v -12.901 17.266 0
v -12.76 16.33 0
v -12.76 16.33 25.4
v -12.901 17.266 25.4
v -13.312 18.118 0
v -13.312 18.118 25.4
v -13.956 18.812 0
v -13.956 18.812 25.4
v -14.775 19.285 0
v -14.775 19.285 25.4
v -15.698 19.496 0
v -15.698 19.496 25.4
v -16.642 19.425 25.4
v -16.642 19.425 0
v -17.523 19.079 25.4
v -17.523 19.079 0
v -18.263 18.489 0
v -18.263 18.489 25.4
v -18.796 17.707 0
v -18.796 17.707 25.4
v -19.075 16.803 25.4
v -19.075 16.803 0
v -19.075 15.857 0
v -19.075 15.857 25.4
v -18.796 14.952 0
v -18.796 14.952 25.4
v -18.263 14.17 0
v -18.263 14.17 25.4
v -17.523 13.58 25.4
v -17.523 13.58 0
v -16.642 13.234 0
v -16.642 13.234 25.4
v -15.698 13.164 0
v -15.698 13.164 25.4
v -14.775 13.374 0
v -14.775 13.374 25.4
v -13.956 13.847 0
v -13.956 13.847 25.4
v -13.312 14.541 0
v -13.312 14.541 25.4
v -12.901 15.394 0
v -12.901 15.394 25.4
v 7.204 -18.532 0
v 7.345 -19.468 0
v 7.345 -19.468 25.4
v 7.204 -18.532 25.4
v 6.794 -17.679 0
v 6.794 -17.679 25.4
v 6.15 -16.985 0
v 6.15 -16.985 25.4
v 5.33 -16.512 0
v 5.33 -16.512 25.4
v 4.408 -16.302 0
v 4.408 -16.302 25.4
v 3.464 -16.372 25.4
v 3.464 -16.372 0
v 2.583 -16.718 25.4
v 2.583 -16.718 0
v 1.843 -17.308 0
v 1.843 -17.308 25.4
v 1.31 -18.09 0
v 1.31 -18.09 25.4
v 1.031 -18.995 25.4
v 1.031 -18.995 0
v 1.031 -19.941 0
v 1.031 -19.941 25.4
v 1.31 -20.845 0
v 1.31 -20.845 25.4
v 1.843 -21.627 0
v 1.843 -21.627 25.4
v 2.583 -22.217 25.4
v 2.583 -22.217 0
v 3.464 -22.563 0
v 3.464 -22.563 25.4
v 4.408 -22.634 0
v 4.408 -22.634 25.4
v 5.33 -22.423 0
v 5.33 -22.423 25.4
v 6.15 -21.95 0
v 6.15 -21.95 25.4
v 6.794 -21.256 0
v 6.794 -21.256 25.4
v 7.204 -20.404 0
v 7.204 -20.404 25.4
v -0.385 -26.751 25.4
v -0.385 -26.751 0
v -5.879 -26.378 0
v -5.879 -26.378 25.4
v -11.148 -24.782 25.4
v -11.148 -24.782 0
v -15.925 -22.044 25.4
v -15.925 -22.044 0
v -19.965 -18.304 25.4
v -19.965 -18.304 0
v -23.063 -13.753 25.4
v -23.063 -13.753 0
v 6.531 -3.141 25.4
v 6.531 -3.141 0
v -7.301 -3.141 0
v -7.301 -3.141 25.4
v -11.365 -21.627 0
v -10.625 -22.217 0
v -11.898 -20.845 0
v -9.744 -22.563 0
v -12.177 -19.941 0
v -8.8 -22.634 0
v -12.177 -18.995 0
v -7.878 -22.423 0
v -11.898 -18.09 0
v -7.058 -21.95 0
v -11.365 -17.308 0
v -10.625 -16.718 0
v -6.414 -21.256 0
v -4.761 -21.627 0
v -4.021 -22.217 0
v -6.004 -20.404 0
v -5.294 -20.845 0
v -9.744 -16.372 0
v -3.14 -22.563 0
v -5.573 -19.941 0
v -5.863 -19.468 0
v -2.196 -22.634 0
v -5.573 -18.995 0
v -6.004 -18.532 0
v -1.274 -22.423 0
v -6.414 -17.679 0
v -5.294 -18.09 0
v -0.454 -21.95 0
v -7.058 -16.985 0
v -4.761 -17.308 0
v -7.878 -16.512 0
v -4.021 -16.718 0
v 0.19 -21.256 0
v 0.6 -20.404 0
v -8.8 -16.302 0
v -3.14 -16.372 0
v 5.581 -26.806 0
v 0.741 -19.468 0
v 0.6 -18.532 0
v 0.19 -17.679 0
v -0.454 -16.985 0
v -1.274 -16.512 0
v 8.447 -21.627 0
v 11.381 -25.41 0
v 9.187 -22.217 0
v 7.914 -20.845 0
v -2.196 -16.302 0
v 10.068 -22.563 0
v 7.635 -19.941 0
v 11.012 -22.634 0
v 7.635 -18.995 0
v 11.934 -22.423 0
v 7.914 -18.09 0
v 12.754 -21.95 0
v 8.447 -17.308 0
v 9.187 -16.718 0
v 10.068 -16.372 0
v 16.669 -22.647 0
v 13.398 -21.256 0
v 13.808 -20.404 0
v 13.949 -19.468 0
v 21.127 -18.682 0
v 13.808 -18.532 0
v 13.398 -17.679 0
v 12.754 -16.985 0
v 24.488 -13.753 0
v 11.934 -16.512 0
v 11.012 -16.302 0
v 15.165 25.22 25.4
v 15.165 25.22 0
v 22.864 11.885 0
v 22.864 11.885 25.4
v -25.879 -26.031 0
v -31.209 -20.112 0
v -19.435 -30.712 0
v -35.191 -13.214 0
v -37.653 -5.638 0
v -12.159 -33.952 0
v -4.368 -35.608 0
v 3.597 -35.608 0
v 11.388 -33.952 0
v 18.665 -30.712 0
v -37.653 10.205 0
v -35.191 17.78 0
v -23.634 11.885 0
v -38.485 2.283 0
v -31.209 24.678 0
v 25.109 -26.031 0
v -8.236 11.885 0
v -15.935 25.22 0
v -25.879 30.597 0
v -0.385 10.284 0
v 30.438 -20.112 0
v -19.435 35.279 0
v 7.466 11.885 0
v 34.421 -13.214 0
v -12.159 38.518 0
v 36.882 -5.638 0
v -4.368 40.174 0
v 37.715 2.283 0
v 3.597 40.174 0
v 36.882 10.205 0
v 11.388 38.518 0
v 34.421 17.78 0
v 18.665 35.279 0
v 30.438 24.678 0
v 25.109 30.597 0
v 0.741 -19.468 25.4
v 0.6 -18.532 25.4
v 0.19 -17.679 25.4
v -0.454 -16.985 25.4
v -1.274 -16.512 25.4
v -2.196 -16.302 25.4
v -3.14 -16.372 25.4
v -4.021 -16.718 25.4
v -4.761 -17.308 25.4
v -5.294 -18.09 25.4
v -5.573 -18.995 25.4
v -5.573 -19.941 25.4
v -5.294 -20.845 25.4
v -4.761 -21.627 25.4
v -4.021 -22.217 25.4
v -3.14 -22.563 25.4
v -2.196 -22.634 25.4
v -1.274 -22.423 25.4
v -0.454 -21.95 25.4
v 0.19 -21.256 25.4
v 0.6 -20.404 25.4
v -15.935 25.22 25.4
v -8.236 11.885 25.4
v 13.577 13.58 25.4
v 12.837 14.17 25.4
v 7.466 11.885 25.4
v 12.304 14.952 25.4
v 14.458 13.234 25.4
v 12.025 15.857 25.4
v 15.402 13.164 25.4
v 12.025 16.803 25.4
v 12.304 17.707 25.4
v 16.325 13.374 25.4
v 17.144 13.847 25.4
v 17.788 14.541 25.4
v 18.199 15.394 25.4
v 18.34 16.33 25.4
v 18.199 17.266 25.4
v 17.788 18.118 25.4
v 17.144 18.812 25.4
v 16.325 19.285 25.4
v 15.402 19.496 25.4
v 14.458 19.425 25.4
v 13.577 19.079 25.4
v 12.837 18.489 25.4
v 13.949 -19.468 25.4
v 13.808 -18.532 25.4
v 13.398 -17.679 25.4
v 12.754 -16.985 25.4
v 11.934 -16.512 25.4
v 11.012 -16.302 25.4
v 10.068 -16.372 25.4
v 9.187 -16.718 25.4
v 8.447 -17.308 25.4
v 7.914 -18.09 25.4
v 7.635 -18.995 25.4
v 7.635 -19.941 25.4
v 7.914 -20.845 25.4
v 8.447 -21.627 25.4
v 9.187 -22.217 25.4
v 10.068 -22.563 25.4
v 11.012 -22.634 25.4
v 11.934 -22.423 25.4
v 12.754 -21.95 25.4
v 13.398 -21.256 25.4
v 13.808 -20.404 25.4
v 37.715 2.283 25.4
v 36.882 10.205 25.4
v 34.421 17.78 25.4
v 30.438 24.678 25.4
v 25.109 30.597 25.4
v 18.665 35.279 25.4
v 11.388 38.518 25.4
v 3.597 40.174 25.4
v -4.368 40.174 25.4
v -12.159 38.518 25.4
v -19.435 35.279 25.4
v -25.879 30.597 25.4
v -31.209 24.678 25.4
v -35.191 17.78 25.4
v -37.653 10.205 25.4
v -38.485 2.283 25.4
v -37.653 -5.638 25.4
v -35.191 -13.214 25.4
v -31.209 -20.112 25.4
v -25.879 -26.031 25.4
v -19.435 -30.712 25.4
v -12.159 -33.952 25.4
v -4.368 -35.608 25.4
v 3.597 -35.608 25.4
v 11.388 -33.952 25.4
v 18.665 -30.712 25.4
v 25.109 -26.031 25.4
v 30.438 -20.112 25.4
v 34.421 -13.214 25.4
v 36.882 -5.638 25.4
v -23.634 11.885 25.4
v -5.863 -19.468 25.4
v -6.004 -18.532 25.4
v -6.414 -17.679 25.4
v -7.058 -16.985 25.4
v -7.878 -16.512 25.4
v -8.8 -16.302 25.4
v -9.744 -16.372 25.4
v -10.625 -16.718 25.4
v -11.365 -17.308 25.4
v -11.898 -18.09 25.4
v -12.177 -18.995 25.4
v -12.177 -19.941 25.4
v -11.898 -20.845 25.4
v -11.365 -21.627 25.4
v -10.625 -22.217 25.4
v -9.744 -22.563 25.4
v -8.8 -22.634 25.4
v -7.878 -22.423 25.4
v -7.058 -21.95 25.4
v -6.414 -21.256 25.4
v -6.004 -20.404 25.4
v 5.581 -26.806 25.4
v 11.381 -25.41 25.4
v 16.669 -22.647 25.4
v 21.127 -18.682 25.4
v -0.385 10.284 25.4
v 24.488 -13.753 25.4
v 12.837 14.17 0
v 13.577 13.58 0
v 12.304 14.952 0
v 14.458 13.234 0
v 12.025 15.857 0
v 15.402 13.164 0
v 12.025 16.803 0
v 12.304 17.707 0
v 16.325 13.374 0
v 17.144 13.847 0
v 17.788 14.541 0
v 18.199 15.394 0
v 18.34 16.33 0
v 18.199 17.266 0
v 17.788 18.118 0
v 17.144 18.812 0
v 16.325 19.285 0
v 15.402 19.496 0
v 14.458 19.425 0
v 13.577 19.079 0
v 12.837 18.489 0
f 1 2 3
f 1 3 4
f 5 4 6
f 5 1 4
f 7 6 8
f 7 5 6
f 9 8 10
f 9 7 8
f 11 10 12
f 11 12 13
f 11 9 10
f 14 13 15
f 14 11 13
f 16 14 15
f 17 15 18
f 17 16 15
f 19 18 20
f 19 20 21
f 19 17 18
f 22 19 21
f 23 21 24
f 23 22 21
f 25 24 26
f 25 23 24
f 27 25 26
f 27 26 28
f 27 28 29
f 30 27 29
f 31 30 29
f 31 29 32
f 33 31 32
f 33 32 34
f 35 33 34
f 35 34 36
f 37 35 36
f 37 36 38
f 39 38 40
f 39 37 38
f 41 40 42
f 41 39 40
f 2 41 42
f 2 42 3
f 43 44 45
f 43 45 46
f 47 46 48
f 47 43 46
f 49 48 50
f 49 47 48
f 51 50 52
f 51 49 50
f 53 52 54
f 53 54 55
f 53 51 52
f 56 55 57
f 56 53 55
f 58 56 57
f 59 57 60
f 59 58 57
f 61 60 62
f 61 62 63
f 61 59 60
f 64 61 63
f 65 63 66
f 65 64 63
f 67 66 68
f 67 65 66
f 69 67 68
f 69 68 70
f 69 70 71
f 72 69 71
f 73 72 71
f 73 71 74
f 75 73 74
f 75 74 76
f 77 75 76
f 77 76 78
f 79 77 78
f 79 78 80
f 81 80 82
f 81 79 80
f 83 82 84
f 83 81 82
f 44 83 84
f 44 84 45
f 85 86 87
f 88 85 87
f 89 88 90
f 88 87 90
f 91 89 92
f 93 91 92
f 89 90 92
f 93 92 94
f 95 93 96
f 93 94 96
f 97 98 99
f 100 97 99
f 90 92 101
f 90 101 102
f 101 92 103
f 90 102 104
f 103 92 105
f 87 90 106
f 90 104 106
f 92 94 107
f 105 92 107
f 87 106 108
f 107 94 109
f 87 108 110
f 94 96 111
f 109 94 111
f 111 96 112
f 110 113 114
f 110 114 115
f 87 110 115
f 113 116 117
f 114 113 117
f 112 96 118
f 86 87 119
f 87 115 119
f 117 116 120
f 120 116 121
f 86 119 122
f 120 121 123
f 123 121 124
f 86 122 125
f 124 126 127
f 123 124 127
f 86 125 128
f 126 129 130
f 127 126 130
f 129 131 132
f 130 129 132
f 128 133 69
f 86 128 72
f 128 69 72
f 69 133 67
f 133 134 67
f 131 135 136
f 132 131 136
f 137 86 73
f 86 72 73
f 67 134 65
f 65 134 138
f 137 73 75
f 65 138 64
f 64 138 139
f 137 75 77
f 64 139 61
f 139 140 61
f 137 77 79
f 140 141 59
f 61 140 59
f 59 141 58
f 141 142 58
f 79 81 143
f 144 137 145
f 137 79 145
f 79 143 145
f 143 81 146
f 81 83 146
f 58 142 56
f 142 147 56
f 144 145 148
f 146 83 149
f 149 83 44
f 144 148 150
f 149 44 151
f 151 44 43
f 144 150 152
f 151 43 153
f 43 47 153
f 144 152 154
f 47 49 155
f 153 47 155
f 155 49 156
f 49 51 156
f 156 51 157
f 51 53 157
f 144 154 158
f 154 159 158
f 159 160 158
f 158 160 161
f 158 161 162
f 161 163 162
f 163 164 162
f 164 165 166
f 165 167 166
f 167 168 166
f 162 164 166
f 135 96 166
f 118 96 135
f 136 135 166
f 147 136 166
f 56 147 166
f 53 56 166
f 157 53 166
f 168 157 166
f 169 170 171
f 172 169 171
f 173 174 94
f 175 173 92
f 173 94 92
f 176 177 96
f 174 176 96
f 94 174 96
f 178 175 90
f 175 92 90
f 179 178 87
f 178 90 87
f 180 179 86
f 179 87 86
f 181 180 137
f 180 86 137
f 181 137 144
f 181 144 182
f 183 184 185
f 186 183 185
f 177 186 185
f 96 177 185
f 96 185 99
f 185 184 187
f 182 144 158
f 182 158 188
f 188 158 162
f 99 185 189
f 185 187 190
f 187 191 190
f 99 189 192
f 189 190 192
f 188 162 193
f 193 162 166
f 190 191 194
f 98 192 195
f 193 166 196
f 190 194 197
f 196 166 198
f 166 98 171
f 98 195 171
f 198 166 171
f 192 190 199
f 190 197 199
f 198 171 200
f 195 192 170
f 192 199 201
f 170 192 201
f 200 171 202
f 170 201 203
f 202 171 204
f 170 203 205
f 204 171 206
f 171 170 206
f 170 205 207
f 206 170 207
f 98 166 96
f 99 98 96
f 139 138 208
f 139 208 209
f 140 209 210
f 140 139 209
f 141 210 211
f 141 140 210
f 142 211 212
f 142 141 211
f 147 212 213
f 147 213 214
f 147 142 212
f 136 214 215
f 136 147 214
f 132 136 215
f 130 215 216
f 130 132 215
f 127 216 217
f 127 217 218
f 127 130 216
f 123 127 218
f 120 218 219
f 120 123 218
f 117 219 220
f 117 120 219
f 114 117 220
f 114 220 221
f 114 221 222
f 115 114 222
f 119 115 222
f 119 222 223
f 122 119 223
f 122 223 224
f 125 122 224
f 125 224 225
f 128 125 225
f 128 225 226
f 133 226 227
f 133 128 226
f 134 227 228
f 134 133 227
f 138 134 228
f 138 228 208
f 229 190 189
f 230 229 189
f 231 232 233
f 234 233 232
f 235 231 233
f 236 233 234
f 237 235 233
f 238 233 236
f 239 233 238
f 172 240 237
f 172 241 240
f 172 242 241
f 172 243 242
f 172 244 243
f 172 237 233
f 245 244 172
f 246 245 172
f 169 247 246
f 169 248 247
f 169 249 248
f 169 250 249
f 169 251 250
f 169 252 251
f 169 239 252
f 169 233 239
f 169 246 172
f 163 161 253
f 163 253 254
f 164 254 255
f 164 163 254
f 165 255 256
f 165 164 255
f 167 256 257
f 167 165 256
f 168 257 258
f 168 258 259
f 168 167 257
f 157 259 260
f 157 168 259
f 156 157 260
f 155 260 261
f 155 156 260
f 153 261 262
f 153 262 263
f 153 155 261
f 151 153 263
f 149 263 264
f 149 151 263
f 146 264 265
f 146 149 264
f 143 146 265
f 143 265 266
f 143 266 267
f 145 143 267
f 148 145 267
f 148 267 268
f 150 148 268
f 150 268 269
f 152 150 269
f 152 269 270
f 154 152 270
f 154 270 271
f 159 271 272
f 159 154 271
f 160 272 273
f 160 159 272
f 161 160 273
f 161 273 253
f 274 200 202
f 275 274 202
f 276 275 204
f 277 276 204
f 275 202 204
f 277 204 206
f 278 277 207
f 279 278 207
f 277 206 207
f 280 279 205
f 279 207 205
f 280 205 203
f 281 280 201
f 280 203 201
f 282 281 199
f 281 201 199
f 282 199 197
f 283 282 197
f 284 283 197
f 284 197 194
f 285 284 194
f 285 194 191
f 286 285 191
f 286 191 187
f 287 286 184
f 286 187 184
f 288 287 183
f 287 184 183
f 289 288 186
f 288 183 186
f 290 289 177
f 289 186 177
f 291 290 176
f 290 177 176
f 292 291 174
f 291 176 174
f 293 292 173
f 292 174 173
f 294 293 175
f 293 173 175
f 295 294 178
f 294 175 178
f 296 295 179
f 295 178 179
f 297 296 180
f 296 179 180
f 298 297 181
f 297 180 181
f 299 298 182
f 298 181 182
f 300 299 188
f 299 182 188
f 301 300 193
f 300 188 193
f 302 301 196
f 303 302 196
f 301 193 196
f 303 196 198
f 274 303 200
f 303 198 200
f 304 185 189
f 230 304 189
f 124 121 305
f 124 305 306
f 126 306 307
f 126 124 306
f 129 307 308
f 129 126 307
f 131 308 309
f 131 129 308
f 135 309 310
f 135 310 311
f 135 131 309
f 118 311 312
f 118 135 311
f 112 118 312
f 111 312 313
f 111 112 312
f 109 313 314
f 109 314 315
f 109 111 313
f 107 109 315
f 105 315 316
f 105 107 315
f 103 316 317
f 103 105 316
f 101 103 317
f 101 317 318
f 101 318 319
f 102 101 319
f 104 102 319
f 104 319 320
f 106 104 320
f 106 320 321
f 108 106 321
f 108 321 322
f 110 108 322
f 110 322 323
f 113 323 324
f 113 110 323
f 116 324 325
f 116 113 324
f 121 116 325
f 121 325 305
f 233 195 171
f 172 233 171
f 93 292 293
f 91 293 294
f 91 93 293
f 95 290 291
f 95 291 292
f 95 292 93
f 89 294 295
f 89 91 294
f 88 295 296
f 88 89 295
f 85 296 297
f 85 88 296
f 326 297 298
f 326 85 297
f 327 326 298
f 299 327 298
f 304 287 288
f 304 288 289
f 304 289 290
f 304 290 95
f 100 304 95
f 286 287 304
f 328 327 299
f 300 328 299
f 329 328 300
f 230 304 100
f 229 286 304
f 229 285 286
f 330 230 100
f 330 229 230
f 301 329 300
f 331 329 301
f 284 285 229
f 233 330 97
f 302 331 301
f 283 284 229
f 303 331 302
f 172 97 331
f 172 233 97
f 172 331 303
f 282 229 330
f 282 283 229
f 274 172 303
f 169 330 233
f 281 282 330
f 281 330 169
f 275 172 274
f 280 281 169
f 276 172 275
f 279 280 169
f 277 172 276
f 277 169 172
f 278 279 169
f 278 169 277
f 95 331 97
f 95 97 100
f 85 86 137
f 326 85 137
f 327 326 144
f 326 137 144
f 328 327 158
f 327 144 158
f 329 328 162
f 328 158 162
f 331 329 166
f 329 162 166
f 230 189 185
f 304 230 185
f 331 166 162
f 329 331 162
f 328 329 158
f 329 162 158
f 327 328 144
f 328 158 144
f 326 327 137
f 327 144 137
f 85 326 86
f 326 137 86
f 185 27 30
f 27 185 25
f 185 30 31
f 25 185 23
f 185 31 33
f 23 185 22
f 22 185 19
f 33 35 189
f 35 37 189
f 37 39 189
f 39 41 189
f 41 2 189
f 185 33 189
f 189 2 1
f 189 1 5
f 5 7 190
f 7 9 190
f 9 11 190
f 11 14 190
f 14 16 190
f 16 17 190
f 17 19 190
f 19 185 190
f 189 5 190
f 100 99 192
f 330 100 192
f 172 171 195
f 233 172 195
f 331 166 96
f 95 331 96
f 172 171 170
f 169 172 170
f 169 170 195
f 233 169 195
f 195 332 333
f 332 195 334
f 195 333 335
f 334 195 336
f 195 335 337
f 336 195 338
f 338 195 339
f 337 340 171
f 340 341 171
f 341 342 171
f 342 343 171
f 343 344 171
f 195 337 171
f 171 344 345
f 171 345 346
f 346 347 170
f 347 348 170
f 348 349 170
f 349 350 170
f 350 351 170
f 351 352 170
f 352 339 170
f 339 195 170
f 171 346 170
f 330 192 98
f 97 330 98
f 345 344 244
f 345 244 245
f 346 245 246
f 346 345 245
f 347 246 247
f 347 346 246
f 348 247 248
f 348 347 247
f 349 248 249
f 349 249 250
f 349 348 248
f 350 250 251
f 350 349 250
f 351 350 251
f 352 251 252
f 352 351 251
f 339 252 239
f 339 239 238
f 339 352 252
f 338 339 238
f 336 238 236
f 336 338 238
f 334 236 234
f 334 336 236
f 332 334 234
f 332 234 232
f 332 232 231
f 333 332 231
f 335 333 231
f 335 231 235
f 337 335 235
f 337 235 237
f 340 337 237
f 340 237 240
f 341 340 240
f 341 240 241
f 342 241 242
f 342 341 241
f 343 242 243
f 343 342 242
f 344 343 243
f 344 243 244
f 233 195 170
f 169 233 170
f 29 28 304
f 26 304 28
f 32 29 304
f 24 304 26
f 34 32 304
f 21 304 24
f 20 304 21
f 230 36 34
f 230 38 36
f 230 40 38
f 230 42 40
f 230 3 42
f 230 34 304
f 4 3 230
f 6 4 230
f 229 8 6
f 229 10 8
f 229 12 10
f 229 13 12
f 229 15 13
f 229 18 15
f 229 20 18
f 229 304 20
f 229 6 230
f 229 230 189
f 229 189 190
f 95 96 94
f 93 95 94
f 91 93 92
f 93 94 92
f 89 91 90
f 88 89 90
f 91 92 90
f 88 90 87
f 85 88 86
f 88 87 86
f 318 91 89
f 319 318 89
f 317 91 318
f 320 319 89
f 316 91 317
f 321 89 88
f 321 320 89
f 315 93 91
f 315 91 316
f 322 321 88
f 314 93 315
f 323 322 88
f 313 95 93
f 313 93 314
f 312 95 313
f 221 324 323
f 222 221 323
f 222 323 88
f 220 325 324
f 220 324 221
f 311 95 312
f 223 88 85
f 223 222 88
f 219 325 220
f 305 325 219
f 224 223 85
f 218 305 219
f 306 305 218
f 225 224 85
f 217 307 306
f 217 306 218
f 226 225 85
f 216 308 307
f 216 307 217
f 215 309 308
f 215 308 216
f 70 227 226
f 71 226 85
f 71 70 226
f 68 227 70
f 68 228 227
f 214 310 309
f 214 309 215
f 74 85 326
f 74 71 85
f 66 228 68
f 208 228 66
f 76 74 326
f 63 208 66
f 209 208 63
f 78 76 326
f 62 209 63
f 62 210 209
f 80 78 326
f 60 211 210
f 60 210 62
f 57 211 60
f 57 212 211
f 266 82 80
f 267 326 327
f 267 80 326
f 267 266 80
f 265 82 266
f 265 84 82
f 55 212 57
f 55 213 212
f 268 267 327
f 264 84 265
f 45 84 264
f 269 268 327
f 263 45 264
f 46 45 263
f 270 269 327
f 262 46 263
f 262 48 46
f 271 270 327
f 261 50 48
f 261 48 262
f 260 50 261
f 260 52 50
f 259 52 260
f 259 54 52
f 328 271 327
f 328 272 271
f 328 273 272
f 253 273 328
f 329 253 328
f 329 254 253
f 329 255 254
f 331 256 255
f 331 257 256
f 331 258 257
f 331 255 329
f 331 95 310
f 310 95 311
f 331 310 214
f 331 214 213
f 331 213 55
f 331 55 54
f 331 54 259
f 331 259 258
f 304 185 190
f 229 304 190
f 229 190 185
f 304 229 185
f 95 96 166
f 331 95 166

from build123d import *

# Parameters (mm, degrees)
F0_R     = 38.1
F1_DEPTH = 25.4
F0_R_2   = 3.175
F2_DEPTH = 25.4
F3_DEPTH = 25.4
F4_DEPTH = 25.4


with BuildPart() as f1:
    # F0 (on Top) → F1 (new body)
    with BuildSketch(Plane.XY):
        with Locations((-0.38536, 2.283093)):
            Circle(F0_R)
        with BuildLine():
            ThreePointArc((-0.38536, -26.750934), (-13.613874, -23.548607), (-23.063175, -13.752731))
            Line((-23.063175, -13.752731), (24.4885, -13.752731))
            ThreePointArc((24.4885, -13.752731), (14.10996, -24.190847), (-0.38536, -26.750934))
        make_face(mode=Mode.SUBTRACT)
        Polygon((-23.634351, 11.884757), (-15.935385, 25.219757), (-8.236419, 11.884757), align=None, mode=Mode.SUBTRACT)
        Polygon((-7.301479, -3.141313), (-0.38536, 10.284094), (6.530759, -3.141313), align=None, mode=Mode.SUBTRACT)
        Polygon((7.465698, 11.884757), (15.164664, 25.219757), (22.86363, 11.884757), align=None, mode=Mode.SUBTRACT)
    extrude(amount=F1_DEPTH)


with BuildPart() as f2:
    # F0 (on Top) → F2 (new body)
    with BuildSketch(Plane.XY):
        Polygon((-8.236419, 11.884757), (-15.935385, 25.219757), (-23.634351, 11.884757), align=None)
        with Locations((-15.935385, 16.329757)):
            Circle(F0_R_2, mode=Mode.SUBTRACT)
    extrude(amount=F2_DEPTH)


with BuildPart() as f3:
    # F0 (on Top) → F3 (new body)
    with BuildSketch(Plane.XY):
        Polygon((22.86363, 11.884757), (15.164664, 25.219757), (7.465698, 11.884757), align=None)
        with Locations((15.164664, 16.329757)):
            Circle(F0_R_2, mode=Mode.SUBTRACT)
    extrude(amount=F3_DEPTH)


with BuildPart() as f4:
    # F0 (on Top) → F4 (new body)
    with BuildSketch(Plane.XY):
        with BuildLine():
            Line((24.4885, -13.752731), (-23.063175, -13.752731))
            ThreePointArc((-23.063175, -13.752731), (-13.613874, -23.548607), (-0.38536, -26.750934))
            ThreePointArc((-0.38536, -26.750934), (14.10996, -24.190847), (24.4885, -13.752731))
        make_face()
        with Locations((-9.037561, -19.467731)):
            Circle(F0_R_2, mode=Mode.SUBTRACT)
        with Locations((-2.433561, -19.467731)):
            Circle(F0_R_2, mode=Mode.SUBTRACT)
        with Locations((4.170439, -19.467731)):
            Circle(F0_R_2, mode=Mode.SUBTRACT)
        with Locations((10.774439, -19.467731)):
            Circle(F0_R_2, mode=Mode.SUBTRACT)
    extrude(amount=F4_DEPTH)


solid = Compound([f1.part, f2.part, f3.part, f4.part])
